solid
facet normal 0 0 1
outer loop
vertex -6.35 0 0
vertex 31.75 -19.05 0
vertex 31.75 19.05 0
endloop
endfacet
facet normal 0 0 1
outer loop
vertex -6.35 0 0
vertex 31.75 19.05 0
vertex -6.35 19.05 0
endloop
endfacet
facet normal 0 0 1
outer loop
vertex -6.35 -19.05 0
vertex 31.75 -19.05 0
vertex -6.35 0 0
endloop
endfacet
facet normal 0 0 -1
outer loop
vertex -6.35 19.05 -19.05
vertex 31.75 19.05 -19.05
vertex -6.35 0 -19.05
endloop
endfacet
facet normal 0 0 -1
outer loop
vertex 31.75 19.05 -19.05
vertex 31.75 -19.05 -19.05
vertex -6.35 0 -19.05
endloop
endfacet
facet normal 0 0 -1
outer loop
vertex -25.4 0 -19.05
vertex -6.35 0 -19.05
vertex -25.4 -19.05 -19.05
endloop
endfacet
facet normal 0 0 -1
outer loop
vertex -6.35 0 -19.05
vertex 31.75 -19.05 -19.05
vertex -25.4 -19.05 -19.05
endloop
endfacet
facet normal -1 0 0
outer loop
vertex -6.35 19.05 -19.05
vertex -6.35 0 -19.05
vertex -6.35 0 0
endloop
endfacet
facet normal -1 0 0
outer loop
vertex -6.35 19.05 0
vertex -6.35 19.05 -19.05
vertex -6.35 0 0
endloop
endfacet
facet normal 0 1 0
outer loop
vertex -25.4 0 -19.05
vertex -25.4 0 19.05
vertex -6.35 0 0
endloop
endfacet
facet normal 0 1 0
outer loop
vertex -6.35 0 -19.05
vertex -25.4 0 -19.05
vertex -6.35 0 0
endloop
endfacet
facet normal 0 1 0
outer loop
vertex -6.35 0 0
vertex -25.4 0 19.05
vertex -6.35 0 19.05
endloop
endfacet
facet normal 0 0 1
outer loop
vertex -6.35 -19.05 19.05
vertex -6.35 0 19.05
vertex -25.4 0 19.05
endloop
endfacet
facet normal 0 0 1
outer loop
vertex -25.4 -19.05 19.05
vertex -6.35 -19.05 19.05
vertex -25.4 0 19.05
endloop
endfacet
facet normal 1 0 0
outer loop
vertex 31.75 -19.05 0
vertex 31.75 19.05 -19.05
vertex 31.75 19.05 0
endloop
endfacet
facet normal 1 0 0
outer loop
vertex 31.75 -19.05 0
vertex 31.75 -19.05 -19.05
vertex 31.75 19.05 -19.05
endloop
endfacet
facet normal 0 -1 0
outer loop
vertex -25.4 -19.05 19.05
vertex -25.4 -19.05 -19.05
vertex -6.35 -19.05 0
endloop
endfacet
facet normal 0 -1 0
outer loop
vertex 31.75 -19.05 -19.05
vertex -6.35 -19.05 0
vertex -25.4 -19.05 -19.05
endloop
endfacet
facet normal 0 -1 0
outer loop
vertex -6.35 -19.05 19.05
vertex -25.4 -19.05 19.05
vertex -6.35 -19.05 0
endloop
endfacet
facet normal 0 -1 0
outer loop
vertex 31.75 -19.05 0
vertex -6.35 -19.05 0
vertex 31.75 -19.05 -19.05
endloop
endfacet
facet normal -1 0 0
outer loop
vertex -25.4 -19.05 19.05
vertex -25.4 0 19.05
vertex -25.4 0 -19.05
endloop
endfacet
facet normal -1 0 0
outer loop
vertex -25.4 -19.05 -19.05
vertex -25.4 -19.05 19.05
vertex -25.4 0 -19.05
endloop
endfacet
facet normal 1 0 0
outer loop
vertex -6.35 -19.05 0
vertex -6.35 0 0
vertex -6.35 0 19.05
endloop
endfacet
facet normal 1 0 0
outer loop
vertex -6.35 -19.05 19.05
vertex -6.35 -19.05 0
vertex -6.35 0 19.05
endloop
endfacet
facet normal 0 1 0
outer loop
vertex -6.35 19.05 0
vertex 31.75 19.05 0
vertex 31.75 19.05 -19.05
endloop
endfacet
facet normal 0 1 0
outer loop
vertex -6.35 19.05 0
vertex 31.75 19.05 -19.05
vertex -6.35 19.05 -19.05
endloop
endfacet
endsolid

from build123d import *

# Parameters (mm, degrees)
F1_DEPTH = 19.05
F2_W     = 38.1
F2_H     = 19.05
F3_DEPTH = 19.05


with BuildPart() as f1:
    # F0 (on Front) → F1 (new body)
    with BuildSketch(Plane.XZ):
        Polygon((-25.4, 19.05), (-25.4, -19.05), (31.75, -19.05), (31.75, 0), (-6.35, 0), (-6.35, 19.05), align=None)
    extrude(amount=F1_DEPTH)

    # F2 (on face) → F3 (join)
    with BuildSketch(Plane(origin=(0, 0, 0), x_dir=(-1, 0, 0), z_dir=(0, 1, 0))):
        with Locations((-12.7, -9.525)):
            Rectangle(F2_W, F2_H)
    extrude(amount=F3_DEPTH)


solid = f1.part
